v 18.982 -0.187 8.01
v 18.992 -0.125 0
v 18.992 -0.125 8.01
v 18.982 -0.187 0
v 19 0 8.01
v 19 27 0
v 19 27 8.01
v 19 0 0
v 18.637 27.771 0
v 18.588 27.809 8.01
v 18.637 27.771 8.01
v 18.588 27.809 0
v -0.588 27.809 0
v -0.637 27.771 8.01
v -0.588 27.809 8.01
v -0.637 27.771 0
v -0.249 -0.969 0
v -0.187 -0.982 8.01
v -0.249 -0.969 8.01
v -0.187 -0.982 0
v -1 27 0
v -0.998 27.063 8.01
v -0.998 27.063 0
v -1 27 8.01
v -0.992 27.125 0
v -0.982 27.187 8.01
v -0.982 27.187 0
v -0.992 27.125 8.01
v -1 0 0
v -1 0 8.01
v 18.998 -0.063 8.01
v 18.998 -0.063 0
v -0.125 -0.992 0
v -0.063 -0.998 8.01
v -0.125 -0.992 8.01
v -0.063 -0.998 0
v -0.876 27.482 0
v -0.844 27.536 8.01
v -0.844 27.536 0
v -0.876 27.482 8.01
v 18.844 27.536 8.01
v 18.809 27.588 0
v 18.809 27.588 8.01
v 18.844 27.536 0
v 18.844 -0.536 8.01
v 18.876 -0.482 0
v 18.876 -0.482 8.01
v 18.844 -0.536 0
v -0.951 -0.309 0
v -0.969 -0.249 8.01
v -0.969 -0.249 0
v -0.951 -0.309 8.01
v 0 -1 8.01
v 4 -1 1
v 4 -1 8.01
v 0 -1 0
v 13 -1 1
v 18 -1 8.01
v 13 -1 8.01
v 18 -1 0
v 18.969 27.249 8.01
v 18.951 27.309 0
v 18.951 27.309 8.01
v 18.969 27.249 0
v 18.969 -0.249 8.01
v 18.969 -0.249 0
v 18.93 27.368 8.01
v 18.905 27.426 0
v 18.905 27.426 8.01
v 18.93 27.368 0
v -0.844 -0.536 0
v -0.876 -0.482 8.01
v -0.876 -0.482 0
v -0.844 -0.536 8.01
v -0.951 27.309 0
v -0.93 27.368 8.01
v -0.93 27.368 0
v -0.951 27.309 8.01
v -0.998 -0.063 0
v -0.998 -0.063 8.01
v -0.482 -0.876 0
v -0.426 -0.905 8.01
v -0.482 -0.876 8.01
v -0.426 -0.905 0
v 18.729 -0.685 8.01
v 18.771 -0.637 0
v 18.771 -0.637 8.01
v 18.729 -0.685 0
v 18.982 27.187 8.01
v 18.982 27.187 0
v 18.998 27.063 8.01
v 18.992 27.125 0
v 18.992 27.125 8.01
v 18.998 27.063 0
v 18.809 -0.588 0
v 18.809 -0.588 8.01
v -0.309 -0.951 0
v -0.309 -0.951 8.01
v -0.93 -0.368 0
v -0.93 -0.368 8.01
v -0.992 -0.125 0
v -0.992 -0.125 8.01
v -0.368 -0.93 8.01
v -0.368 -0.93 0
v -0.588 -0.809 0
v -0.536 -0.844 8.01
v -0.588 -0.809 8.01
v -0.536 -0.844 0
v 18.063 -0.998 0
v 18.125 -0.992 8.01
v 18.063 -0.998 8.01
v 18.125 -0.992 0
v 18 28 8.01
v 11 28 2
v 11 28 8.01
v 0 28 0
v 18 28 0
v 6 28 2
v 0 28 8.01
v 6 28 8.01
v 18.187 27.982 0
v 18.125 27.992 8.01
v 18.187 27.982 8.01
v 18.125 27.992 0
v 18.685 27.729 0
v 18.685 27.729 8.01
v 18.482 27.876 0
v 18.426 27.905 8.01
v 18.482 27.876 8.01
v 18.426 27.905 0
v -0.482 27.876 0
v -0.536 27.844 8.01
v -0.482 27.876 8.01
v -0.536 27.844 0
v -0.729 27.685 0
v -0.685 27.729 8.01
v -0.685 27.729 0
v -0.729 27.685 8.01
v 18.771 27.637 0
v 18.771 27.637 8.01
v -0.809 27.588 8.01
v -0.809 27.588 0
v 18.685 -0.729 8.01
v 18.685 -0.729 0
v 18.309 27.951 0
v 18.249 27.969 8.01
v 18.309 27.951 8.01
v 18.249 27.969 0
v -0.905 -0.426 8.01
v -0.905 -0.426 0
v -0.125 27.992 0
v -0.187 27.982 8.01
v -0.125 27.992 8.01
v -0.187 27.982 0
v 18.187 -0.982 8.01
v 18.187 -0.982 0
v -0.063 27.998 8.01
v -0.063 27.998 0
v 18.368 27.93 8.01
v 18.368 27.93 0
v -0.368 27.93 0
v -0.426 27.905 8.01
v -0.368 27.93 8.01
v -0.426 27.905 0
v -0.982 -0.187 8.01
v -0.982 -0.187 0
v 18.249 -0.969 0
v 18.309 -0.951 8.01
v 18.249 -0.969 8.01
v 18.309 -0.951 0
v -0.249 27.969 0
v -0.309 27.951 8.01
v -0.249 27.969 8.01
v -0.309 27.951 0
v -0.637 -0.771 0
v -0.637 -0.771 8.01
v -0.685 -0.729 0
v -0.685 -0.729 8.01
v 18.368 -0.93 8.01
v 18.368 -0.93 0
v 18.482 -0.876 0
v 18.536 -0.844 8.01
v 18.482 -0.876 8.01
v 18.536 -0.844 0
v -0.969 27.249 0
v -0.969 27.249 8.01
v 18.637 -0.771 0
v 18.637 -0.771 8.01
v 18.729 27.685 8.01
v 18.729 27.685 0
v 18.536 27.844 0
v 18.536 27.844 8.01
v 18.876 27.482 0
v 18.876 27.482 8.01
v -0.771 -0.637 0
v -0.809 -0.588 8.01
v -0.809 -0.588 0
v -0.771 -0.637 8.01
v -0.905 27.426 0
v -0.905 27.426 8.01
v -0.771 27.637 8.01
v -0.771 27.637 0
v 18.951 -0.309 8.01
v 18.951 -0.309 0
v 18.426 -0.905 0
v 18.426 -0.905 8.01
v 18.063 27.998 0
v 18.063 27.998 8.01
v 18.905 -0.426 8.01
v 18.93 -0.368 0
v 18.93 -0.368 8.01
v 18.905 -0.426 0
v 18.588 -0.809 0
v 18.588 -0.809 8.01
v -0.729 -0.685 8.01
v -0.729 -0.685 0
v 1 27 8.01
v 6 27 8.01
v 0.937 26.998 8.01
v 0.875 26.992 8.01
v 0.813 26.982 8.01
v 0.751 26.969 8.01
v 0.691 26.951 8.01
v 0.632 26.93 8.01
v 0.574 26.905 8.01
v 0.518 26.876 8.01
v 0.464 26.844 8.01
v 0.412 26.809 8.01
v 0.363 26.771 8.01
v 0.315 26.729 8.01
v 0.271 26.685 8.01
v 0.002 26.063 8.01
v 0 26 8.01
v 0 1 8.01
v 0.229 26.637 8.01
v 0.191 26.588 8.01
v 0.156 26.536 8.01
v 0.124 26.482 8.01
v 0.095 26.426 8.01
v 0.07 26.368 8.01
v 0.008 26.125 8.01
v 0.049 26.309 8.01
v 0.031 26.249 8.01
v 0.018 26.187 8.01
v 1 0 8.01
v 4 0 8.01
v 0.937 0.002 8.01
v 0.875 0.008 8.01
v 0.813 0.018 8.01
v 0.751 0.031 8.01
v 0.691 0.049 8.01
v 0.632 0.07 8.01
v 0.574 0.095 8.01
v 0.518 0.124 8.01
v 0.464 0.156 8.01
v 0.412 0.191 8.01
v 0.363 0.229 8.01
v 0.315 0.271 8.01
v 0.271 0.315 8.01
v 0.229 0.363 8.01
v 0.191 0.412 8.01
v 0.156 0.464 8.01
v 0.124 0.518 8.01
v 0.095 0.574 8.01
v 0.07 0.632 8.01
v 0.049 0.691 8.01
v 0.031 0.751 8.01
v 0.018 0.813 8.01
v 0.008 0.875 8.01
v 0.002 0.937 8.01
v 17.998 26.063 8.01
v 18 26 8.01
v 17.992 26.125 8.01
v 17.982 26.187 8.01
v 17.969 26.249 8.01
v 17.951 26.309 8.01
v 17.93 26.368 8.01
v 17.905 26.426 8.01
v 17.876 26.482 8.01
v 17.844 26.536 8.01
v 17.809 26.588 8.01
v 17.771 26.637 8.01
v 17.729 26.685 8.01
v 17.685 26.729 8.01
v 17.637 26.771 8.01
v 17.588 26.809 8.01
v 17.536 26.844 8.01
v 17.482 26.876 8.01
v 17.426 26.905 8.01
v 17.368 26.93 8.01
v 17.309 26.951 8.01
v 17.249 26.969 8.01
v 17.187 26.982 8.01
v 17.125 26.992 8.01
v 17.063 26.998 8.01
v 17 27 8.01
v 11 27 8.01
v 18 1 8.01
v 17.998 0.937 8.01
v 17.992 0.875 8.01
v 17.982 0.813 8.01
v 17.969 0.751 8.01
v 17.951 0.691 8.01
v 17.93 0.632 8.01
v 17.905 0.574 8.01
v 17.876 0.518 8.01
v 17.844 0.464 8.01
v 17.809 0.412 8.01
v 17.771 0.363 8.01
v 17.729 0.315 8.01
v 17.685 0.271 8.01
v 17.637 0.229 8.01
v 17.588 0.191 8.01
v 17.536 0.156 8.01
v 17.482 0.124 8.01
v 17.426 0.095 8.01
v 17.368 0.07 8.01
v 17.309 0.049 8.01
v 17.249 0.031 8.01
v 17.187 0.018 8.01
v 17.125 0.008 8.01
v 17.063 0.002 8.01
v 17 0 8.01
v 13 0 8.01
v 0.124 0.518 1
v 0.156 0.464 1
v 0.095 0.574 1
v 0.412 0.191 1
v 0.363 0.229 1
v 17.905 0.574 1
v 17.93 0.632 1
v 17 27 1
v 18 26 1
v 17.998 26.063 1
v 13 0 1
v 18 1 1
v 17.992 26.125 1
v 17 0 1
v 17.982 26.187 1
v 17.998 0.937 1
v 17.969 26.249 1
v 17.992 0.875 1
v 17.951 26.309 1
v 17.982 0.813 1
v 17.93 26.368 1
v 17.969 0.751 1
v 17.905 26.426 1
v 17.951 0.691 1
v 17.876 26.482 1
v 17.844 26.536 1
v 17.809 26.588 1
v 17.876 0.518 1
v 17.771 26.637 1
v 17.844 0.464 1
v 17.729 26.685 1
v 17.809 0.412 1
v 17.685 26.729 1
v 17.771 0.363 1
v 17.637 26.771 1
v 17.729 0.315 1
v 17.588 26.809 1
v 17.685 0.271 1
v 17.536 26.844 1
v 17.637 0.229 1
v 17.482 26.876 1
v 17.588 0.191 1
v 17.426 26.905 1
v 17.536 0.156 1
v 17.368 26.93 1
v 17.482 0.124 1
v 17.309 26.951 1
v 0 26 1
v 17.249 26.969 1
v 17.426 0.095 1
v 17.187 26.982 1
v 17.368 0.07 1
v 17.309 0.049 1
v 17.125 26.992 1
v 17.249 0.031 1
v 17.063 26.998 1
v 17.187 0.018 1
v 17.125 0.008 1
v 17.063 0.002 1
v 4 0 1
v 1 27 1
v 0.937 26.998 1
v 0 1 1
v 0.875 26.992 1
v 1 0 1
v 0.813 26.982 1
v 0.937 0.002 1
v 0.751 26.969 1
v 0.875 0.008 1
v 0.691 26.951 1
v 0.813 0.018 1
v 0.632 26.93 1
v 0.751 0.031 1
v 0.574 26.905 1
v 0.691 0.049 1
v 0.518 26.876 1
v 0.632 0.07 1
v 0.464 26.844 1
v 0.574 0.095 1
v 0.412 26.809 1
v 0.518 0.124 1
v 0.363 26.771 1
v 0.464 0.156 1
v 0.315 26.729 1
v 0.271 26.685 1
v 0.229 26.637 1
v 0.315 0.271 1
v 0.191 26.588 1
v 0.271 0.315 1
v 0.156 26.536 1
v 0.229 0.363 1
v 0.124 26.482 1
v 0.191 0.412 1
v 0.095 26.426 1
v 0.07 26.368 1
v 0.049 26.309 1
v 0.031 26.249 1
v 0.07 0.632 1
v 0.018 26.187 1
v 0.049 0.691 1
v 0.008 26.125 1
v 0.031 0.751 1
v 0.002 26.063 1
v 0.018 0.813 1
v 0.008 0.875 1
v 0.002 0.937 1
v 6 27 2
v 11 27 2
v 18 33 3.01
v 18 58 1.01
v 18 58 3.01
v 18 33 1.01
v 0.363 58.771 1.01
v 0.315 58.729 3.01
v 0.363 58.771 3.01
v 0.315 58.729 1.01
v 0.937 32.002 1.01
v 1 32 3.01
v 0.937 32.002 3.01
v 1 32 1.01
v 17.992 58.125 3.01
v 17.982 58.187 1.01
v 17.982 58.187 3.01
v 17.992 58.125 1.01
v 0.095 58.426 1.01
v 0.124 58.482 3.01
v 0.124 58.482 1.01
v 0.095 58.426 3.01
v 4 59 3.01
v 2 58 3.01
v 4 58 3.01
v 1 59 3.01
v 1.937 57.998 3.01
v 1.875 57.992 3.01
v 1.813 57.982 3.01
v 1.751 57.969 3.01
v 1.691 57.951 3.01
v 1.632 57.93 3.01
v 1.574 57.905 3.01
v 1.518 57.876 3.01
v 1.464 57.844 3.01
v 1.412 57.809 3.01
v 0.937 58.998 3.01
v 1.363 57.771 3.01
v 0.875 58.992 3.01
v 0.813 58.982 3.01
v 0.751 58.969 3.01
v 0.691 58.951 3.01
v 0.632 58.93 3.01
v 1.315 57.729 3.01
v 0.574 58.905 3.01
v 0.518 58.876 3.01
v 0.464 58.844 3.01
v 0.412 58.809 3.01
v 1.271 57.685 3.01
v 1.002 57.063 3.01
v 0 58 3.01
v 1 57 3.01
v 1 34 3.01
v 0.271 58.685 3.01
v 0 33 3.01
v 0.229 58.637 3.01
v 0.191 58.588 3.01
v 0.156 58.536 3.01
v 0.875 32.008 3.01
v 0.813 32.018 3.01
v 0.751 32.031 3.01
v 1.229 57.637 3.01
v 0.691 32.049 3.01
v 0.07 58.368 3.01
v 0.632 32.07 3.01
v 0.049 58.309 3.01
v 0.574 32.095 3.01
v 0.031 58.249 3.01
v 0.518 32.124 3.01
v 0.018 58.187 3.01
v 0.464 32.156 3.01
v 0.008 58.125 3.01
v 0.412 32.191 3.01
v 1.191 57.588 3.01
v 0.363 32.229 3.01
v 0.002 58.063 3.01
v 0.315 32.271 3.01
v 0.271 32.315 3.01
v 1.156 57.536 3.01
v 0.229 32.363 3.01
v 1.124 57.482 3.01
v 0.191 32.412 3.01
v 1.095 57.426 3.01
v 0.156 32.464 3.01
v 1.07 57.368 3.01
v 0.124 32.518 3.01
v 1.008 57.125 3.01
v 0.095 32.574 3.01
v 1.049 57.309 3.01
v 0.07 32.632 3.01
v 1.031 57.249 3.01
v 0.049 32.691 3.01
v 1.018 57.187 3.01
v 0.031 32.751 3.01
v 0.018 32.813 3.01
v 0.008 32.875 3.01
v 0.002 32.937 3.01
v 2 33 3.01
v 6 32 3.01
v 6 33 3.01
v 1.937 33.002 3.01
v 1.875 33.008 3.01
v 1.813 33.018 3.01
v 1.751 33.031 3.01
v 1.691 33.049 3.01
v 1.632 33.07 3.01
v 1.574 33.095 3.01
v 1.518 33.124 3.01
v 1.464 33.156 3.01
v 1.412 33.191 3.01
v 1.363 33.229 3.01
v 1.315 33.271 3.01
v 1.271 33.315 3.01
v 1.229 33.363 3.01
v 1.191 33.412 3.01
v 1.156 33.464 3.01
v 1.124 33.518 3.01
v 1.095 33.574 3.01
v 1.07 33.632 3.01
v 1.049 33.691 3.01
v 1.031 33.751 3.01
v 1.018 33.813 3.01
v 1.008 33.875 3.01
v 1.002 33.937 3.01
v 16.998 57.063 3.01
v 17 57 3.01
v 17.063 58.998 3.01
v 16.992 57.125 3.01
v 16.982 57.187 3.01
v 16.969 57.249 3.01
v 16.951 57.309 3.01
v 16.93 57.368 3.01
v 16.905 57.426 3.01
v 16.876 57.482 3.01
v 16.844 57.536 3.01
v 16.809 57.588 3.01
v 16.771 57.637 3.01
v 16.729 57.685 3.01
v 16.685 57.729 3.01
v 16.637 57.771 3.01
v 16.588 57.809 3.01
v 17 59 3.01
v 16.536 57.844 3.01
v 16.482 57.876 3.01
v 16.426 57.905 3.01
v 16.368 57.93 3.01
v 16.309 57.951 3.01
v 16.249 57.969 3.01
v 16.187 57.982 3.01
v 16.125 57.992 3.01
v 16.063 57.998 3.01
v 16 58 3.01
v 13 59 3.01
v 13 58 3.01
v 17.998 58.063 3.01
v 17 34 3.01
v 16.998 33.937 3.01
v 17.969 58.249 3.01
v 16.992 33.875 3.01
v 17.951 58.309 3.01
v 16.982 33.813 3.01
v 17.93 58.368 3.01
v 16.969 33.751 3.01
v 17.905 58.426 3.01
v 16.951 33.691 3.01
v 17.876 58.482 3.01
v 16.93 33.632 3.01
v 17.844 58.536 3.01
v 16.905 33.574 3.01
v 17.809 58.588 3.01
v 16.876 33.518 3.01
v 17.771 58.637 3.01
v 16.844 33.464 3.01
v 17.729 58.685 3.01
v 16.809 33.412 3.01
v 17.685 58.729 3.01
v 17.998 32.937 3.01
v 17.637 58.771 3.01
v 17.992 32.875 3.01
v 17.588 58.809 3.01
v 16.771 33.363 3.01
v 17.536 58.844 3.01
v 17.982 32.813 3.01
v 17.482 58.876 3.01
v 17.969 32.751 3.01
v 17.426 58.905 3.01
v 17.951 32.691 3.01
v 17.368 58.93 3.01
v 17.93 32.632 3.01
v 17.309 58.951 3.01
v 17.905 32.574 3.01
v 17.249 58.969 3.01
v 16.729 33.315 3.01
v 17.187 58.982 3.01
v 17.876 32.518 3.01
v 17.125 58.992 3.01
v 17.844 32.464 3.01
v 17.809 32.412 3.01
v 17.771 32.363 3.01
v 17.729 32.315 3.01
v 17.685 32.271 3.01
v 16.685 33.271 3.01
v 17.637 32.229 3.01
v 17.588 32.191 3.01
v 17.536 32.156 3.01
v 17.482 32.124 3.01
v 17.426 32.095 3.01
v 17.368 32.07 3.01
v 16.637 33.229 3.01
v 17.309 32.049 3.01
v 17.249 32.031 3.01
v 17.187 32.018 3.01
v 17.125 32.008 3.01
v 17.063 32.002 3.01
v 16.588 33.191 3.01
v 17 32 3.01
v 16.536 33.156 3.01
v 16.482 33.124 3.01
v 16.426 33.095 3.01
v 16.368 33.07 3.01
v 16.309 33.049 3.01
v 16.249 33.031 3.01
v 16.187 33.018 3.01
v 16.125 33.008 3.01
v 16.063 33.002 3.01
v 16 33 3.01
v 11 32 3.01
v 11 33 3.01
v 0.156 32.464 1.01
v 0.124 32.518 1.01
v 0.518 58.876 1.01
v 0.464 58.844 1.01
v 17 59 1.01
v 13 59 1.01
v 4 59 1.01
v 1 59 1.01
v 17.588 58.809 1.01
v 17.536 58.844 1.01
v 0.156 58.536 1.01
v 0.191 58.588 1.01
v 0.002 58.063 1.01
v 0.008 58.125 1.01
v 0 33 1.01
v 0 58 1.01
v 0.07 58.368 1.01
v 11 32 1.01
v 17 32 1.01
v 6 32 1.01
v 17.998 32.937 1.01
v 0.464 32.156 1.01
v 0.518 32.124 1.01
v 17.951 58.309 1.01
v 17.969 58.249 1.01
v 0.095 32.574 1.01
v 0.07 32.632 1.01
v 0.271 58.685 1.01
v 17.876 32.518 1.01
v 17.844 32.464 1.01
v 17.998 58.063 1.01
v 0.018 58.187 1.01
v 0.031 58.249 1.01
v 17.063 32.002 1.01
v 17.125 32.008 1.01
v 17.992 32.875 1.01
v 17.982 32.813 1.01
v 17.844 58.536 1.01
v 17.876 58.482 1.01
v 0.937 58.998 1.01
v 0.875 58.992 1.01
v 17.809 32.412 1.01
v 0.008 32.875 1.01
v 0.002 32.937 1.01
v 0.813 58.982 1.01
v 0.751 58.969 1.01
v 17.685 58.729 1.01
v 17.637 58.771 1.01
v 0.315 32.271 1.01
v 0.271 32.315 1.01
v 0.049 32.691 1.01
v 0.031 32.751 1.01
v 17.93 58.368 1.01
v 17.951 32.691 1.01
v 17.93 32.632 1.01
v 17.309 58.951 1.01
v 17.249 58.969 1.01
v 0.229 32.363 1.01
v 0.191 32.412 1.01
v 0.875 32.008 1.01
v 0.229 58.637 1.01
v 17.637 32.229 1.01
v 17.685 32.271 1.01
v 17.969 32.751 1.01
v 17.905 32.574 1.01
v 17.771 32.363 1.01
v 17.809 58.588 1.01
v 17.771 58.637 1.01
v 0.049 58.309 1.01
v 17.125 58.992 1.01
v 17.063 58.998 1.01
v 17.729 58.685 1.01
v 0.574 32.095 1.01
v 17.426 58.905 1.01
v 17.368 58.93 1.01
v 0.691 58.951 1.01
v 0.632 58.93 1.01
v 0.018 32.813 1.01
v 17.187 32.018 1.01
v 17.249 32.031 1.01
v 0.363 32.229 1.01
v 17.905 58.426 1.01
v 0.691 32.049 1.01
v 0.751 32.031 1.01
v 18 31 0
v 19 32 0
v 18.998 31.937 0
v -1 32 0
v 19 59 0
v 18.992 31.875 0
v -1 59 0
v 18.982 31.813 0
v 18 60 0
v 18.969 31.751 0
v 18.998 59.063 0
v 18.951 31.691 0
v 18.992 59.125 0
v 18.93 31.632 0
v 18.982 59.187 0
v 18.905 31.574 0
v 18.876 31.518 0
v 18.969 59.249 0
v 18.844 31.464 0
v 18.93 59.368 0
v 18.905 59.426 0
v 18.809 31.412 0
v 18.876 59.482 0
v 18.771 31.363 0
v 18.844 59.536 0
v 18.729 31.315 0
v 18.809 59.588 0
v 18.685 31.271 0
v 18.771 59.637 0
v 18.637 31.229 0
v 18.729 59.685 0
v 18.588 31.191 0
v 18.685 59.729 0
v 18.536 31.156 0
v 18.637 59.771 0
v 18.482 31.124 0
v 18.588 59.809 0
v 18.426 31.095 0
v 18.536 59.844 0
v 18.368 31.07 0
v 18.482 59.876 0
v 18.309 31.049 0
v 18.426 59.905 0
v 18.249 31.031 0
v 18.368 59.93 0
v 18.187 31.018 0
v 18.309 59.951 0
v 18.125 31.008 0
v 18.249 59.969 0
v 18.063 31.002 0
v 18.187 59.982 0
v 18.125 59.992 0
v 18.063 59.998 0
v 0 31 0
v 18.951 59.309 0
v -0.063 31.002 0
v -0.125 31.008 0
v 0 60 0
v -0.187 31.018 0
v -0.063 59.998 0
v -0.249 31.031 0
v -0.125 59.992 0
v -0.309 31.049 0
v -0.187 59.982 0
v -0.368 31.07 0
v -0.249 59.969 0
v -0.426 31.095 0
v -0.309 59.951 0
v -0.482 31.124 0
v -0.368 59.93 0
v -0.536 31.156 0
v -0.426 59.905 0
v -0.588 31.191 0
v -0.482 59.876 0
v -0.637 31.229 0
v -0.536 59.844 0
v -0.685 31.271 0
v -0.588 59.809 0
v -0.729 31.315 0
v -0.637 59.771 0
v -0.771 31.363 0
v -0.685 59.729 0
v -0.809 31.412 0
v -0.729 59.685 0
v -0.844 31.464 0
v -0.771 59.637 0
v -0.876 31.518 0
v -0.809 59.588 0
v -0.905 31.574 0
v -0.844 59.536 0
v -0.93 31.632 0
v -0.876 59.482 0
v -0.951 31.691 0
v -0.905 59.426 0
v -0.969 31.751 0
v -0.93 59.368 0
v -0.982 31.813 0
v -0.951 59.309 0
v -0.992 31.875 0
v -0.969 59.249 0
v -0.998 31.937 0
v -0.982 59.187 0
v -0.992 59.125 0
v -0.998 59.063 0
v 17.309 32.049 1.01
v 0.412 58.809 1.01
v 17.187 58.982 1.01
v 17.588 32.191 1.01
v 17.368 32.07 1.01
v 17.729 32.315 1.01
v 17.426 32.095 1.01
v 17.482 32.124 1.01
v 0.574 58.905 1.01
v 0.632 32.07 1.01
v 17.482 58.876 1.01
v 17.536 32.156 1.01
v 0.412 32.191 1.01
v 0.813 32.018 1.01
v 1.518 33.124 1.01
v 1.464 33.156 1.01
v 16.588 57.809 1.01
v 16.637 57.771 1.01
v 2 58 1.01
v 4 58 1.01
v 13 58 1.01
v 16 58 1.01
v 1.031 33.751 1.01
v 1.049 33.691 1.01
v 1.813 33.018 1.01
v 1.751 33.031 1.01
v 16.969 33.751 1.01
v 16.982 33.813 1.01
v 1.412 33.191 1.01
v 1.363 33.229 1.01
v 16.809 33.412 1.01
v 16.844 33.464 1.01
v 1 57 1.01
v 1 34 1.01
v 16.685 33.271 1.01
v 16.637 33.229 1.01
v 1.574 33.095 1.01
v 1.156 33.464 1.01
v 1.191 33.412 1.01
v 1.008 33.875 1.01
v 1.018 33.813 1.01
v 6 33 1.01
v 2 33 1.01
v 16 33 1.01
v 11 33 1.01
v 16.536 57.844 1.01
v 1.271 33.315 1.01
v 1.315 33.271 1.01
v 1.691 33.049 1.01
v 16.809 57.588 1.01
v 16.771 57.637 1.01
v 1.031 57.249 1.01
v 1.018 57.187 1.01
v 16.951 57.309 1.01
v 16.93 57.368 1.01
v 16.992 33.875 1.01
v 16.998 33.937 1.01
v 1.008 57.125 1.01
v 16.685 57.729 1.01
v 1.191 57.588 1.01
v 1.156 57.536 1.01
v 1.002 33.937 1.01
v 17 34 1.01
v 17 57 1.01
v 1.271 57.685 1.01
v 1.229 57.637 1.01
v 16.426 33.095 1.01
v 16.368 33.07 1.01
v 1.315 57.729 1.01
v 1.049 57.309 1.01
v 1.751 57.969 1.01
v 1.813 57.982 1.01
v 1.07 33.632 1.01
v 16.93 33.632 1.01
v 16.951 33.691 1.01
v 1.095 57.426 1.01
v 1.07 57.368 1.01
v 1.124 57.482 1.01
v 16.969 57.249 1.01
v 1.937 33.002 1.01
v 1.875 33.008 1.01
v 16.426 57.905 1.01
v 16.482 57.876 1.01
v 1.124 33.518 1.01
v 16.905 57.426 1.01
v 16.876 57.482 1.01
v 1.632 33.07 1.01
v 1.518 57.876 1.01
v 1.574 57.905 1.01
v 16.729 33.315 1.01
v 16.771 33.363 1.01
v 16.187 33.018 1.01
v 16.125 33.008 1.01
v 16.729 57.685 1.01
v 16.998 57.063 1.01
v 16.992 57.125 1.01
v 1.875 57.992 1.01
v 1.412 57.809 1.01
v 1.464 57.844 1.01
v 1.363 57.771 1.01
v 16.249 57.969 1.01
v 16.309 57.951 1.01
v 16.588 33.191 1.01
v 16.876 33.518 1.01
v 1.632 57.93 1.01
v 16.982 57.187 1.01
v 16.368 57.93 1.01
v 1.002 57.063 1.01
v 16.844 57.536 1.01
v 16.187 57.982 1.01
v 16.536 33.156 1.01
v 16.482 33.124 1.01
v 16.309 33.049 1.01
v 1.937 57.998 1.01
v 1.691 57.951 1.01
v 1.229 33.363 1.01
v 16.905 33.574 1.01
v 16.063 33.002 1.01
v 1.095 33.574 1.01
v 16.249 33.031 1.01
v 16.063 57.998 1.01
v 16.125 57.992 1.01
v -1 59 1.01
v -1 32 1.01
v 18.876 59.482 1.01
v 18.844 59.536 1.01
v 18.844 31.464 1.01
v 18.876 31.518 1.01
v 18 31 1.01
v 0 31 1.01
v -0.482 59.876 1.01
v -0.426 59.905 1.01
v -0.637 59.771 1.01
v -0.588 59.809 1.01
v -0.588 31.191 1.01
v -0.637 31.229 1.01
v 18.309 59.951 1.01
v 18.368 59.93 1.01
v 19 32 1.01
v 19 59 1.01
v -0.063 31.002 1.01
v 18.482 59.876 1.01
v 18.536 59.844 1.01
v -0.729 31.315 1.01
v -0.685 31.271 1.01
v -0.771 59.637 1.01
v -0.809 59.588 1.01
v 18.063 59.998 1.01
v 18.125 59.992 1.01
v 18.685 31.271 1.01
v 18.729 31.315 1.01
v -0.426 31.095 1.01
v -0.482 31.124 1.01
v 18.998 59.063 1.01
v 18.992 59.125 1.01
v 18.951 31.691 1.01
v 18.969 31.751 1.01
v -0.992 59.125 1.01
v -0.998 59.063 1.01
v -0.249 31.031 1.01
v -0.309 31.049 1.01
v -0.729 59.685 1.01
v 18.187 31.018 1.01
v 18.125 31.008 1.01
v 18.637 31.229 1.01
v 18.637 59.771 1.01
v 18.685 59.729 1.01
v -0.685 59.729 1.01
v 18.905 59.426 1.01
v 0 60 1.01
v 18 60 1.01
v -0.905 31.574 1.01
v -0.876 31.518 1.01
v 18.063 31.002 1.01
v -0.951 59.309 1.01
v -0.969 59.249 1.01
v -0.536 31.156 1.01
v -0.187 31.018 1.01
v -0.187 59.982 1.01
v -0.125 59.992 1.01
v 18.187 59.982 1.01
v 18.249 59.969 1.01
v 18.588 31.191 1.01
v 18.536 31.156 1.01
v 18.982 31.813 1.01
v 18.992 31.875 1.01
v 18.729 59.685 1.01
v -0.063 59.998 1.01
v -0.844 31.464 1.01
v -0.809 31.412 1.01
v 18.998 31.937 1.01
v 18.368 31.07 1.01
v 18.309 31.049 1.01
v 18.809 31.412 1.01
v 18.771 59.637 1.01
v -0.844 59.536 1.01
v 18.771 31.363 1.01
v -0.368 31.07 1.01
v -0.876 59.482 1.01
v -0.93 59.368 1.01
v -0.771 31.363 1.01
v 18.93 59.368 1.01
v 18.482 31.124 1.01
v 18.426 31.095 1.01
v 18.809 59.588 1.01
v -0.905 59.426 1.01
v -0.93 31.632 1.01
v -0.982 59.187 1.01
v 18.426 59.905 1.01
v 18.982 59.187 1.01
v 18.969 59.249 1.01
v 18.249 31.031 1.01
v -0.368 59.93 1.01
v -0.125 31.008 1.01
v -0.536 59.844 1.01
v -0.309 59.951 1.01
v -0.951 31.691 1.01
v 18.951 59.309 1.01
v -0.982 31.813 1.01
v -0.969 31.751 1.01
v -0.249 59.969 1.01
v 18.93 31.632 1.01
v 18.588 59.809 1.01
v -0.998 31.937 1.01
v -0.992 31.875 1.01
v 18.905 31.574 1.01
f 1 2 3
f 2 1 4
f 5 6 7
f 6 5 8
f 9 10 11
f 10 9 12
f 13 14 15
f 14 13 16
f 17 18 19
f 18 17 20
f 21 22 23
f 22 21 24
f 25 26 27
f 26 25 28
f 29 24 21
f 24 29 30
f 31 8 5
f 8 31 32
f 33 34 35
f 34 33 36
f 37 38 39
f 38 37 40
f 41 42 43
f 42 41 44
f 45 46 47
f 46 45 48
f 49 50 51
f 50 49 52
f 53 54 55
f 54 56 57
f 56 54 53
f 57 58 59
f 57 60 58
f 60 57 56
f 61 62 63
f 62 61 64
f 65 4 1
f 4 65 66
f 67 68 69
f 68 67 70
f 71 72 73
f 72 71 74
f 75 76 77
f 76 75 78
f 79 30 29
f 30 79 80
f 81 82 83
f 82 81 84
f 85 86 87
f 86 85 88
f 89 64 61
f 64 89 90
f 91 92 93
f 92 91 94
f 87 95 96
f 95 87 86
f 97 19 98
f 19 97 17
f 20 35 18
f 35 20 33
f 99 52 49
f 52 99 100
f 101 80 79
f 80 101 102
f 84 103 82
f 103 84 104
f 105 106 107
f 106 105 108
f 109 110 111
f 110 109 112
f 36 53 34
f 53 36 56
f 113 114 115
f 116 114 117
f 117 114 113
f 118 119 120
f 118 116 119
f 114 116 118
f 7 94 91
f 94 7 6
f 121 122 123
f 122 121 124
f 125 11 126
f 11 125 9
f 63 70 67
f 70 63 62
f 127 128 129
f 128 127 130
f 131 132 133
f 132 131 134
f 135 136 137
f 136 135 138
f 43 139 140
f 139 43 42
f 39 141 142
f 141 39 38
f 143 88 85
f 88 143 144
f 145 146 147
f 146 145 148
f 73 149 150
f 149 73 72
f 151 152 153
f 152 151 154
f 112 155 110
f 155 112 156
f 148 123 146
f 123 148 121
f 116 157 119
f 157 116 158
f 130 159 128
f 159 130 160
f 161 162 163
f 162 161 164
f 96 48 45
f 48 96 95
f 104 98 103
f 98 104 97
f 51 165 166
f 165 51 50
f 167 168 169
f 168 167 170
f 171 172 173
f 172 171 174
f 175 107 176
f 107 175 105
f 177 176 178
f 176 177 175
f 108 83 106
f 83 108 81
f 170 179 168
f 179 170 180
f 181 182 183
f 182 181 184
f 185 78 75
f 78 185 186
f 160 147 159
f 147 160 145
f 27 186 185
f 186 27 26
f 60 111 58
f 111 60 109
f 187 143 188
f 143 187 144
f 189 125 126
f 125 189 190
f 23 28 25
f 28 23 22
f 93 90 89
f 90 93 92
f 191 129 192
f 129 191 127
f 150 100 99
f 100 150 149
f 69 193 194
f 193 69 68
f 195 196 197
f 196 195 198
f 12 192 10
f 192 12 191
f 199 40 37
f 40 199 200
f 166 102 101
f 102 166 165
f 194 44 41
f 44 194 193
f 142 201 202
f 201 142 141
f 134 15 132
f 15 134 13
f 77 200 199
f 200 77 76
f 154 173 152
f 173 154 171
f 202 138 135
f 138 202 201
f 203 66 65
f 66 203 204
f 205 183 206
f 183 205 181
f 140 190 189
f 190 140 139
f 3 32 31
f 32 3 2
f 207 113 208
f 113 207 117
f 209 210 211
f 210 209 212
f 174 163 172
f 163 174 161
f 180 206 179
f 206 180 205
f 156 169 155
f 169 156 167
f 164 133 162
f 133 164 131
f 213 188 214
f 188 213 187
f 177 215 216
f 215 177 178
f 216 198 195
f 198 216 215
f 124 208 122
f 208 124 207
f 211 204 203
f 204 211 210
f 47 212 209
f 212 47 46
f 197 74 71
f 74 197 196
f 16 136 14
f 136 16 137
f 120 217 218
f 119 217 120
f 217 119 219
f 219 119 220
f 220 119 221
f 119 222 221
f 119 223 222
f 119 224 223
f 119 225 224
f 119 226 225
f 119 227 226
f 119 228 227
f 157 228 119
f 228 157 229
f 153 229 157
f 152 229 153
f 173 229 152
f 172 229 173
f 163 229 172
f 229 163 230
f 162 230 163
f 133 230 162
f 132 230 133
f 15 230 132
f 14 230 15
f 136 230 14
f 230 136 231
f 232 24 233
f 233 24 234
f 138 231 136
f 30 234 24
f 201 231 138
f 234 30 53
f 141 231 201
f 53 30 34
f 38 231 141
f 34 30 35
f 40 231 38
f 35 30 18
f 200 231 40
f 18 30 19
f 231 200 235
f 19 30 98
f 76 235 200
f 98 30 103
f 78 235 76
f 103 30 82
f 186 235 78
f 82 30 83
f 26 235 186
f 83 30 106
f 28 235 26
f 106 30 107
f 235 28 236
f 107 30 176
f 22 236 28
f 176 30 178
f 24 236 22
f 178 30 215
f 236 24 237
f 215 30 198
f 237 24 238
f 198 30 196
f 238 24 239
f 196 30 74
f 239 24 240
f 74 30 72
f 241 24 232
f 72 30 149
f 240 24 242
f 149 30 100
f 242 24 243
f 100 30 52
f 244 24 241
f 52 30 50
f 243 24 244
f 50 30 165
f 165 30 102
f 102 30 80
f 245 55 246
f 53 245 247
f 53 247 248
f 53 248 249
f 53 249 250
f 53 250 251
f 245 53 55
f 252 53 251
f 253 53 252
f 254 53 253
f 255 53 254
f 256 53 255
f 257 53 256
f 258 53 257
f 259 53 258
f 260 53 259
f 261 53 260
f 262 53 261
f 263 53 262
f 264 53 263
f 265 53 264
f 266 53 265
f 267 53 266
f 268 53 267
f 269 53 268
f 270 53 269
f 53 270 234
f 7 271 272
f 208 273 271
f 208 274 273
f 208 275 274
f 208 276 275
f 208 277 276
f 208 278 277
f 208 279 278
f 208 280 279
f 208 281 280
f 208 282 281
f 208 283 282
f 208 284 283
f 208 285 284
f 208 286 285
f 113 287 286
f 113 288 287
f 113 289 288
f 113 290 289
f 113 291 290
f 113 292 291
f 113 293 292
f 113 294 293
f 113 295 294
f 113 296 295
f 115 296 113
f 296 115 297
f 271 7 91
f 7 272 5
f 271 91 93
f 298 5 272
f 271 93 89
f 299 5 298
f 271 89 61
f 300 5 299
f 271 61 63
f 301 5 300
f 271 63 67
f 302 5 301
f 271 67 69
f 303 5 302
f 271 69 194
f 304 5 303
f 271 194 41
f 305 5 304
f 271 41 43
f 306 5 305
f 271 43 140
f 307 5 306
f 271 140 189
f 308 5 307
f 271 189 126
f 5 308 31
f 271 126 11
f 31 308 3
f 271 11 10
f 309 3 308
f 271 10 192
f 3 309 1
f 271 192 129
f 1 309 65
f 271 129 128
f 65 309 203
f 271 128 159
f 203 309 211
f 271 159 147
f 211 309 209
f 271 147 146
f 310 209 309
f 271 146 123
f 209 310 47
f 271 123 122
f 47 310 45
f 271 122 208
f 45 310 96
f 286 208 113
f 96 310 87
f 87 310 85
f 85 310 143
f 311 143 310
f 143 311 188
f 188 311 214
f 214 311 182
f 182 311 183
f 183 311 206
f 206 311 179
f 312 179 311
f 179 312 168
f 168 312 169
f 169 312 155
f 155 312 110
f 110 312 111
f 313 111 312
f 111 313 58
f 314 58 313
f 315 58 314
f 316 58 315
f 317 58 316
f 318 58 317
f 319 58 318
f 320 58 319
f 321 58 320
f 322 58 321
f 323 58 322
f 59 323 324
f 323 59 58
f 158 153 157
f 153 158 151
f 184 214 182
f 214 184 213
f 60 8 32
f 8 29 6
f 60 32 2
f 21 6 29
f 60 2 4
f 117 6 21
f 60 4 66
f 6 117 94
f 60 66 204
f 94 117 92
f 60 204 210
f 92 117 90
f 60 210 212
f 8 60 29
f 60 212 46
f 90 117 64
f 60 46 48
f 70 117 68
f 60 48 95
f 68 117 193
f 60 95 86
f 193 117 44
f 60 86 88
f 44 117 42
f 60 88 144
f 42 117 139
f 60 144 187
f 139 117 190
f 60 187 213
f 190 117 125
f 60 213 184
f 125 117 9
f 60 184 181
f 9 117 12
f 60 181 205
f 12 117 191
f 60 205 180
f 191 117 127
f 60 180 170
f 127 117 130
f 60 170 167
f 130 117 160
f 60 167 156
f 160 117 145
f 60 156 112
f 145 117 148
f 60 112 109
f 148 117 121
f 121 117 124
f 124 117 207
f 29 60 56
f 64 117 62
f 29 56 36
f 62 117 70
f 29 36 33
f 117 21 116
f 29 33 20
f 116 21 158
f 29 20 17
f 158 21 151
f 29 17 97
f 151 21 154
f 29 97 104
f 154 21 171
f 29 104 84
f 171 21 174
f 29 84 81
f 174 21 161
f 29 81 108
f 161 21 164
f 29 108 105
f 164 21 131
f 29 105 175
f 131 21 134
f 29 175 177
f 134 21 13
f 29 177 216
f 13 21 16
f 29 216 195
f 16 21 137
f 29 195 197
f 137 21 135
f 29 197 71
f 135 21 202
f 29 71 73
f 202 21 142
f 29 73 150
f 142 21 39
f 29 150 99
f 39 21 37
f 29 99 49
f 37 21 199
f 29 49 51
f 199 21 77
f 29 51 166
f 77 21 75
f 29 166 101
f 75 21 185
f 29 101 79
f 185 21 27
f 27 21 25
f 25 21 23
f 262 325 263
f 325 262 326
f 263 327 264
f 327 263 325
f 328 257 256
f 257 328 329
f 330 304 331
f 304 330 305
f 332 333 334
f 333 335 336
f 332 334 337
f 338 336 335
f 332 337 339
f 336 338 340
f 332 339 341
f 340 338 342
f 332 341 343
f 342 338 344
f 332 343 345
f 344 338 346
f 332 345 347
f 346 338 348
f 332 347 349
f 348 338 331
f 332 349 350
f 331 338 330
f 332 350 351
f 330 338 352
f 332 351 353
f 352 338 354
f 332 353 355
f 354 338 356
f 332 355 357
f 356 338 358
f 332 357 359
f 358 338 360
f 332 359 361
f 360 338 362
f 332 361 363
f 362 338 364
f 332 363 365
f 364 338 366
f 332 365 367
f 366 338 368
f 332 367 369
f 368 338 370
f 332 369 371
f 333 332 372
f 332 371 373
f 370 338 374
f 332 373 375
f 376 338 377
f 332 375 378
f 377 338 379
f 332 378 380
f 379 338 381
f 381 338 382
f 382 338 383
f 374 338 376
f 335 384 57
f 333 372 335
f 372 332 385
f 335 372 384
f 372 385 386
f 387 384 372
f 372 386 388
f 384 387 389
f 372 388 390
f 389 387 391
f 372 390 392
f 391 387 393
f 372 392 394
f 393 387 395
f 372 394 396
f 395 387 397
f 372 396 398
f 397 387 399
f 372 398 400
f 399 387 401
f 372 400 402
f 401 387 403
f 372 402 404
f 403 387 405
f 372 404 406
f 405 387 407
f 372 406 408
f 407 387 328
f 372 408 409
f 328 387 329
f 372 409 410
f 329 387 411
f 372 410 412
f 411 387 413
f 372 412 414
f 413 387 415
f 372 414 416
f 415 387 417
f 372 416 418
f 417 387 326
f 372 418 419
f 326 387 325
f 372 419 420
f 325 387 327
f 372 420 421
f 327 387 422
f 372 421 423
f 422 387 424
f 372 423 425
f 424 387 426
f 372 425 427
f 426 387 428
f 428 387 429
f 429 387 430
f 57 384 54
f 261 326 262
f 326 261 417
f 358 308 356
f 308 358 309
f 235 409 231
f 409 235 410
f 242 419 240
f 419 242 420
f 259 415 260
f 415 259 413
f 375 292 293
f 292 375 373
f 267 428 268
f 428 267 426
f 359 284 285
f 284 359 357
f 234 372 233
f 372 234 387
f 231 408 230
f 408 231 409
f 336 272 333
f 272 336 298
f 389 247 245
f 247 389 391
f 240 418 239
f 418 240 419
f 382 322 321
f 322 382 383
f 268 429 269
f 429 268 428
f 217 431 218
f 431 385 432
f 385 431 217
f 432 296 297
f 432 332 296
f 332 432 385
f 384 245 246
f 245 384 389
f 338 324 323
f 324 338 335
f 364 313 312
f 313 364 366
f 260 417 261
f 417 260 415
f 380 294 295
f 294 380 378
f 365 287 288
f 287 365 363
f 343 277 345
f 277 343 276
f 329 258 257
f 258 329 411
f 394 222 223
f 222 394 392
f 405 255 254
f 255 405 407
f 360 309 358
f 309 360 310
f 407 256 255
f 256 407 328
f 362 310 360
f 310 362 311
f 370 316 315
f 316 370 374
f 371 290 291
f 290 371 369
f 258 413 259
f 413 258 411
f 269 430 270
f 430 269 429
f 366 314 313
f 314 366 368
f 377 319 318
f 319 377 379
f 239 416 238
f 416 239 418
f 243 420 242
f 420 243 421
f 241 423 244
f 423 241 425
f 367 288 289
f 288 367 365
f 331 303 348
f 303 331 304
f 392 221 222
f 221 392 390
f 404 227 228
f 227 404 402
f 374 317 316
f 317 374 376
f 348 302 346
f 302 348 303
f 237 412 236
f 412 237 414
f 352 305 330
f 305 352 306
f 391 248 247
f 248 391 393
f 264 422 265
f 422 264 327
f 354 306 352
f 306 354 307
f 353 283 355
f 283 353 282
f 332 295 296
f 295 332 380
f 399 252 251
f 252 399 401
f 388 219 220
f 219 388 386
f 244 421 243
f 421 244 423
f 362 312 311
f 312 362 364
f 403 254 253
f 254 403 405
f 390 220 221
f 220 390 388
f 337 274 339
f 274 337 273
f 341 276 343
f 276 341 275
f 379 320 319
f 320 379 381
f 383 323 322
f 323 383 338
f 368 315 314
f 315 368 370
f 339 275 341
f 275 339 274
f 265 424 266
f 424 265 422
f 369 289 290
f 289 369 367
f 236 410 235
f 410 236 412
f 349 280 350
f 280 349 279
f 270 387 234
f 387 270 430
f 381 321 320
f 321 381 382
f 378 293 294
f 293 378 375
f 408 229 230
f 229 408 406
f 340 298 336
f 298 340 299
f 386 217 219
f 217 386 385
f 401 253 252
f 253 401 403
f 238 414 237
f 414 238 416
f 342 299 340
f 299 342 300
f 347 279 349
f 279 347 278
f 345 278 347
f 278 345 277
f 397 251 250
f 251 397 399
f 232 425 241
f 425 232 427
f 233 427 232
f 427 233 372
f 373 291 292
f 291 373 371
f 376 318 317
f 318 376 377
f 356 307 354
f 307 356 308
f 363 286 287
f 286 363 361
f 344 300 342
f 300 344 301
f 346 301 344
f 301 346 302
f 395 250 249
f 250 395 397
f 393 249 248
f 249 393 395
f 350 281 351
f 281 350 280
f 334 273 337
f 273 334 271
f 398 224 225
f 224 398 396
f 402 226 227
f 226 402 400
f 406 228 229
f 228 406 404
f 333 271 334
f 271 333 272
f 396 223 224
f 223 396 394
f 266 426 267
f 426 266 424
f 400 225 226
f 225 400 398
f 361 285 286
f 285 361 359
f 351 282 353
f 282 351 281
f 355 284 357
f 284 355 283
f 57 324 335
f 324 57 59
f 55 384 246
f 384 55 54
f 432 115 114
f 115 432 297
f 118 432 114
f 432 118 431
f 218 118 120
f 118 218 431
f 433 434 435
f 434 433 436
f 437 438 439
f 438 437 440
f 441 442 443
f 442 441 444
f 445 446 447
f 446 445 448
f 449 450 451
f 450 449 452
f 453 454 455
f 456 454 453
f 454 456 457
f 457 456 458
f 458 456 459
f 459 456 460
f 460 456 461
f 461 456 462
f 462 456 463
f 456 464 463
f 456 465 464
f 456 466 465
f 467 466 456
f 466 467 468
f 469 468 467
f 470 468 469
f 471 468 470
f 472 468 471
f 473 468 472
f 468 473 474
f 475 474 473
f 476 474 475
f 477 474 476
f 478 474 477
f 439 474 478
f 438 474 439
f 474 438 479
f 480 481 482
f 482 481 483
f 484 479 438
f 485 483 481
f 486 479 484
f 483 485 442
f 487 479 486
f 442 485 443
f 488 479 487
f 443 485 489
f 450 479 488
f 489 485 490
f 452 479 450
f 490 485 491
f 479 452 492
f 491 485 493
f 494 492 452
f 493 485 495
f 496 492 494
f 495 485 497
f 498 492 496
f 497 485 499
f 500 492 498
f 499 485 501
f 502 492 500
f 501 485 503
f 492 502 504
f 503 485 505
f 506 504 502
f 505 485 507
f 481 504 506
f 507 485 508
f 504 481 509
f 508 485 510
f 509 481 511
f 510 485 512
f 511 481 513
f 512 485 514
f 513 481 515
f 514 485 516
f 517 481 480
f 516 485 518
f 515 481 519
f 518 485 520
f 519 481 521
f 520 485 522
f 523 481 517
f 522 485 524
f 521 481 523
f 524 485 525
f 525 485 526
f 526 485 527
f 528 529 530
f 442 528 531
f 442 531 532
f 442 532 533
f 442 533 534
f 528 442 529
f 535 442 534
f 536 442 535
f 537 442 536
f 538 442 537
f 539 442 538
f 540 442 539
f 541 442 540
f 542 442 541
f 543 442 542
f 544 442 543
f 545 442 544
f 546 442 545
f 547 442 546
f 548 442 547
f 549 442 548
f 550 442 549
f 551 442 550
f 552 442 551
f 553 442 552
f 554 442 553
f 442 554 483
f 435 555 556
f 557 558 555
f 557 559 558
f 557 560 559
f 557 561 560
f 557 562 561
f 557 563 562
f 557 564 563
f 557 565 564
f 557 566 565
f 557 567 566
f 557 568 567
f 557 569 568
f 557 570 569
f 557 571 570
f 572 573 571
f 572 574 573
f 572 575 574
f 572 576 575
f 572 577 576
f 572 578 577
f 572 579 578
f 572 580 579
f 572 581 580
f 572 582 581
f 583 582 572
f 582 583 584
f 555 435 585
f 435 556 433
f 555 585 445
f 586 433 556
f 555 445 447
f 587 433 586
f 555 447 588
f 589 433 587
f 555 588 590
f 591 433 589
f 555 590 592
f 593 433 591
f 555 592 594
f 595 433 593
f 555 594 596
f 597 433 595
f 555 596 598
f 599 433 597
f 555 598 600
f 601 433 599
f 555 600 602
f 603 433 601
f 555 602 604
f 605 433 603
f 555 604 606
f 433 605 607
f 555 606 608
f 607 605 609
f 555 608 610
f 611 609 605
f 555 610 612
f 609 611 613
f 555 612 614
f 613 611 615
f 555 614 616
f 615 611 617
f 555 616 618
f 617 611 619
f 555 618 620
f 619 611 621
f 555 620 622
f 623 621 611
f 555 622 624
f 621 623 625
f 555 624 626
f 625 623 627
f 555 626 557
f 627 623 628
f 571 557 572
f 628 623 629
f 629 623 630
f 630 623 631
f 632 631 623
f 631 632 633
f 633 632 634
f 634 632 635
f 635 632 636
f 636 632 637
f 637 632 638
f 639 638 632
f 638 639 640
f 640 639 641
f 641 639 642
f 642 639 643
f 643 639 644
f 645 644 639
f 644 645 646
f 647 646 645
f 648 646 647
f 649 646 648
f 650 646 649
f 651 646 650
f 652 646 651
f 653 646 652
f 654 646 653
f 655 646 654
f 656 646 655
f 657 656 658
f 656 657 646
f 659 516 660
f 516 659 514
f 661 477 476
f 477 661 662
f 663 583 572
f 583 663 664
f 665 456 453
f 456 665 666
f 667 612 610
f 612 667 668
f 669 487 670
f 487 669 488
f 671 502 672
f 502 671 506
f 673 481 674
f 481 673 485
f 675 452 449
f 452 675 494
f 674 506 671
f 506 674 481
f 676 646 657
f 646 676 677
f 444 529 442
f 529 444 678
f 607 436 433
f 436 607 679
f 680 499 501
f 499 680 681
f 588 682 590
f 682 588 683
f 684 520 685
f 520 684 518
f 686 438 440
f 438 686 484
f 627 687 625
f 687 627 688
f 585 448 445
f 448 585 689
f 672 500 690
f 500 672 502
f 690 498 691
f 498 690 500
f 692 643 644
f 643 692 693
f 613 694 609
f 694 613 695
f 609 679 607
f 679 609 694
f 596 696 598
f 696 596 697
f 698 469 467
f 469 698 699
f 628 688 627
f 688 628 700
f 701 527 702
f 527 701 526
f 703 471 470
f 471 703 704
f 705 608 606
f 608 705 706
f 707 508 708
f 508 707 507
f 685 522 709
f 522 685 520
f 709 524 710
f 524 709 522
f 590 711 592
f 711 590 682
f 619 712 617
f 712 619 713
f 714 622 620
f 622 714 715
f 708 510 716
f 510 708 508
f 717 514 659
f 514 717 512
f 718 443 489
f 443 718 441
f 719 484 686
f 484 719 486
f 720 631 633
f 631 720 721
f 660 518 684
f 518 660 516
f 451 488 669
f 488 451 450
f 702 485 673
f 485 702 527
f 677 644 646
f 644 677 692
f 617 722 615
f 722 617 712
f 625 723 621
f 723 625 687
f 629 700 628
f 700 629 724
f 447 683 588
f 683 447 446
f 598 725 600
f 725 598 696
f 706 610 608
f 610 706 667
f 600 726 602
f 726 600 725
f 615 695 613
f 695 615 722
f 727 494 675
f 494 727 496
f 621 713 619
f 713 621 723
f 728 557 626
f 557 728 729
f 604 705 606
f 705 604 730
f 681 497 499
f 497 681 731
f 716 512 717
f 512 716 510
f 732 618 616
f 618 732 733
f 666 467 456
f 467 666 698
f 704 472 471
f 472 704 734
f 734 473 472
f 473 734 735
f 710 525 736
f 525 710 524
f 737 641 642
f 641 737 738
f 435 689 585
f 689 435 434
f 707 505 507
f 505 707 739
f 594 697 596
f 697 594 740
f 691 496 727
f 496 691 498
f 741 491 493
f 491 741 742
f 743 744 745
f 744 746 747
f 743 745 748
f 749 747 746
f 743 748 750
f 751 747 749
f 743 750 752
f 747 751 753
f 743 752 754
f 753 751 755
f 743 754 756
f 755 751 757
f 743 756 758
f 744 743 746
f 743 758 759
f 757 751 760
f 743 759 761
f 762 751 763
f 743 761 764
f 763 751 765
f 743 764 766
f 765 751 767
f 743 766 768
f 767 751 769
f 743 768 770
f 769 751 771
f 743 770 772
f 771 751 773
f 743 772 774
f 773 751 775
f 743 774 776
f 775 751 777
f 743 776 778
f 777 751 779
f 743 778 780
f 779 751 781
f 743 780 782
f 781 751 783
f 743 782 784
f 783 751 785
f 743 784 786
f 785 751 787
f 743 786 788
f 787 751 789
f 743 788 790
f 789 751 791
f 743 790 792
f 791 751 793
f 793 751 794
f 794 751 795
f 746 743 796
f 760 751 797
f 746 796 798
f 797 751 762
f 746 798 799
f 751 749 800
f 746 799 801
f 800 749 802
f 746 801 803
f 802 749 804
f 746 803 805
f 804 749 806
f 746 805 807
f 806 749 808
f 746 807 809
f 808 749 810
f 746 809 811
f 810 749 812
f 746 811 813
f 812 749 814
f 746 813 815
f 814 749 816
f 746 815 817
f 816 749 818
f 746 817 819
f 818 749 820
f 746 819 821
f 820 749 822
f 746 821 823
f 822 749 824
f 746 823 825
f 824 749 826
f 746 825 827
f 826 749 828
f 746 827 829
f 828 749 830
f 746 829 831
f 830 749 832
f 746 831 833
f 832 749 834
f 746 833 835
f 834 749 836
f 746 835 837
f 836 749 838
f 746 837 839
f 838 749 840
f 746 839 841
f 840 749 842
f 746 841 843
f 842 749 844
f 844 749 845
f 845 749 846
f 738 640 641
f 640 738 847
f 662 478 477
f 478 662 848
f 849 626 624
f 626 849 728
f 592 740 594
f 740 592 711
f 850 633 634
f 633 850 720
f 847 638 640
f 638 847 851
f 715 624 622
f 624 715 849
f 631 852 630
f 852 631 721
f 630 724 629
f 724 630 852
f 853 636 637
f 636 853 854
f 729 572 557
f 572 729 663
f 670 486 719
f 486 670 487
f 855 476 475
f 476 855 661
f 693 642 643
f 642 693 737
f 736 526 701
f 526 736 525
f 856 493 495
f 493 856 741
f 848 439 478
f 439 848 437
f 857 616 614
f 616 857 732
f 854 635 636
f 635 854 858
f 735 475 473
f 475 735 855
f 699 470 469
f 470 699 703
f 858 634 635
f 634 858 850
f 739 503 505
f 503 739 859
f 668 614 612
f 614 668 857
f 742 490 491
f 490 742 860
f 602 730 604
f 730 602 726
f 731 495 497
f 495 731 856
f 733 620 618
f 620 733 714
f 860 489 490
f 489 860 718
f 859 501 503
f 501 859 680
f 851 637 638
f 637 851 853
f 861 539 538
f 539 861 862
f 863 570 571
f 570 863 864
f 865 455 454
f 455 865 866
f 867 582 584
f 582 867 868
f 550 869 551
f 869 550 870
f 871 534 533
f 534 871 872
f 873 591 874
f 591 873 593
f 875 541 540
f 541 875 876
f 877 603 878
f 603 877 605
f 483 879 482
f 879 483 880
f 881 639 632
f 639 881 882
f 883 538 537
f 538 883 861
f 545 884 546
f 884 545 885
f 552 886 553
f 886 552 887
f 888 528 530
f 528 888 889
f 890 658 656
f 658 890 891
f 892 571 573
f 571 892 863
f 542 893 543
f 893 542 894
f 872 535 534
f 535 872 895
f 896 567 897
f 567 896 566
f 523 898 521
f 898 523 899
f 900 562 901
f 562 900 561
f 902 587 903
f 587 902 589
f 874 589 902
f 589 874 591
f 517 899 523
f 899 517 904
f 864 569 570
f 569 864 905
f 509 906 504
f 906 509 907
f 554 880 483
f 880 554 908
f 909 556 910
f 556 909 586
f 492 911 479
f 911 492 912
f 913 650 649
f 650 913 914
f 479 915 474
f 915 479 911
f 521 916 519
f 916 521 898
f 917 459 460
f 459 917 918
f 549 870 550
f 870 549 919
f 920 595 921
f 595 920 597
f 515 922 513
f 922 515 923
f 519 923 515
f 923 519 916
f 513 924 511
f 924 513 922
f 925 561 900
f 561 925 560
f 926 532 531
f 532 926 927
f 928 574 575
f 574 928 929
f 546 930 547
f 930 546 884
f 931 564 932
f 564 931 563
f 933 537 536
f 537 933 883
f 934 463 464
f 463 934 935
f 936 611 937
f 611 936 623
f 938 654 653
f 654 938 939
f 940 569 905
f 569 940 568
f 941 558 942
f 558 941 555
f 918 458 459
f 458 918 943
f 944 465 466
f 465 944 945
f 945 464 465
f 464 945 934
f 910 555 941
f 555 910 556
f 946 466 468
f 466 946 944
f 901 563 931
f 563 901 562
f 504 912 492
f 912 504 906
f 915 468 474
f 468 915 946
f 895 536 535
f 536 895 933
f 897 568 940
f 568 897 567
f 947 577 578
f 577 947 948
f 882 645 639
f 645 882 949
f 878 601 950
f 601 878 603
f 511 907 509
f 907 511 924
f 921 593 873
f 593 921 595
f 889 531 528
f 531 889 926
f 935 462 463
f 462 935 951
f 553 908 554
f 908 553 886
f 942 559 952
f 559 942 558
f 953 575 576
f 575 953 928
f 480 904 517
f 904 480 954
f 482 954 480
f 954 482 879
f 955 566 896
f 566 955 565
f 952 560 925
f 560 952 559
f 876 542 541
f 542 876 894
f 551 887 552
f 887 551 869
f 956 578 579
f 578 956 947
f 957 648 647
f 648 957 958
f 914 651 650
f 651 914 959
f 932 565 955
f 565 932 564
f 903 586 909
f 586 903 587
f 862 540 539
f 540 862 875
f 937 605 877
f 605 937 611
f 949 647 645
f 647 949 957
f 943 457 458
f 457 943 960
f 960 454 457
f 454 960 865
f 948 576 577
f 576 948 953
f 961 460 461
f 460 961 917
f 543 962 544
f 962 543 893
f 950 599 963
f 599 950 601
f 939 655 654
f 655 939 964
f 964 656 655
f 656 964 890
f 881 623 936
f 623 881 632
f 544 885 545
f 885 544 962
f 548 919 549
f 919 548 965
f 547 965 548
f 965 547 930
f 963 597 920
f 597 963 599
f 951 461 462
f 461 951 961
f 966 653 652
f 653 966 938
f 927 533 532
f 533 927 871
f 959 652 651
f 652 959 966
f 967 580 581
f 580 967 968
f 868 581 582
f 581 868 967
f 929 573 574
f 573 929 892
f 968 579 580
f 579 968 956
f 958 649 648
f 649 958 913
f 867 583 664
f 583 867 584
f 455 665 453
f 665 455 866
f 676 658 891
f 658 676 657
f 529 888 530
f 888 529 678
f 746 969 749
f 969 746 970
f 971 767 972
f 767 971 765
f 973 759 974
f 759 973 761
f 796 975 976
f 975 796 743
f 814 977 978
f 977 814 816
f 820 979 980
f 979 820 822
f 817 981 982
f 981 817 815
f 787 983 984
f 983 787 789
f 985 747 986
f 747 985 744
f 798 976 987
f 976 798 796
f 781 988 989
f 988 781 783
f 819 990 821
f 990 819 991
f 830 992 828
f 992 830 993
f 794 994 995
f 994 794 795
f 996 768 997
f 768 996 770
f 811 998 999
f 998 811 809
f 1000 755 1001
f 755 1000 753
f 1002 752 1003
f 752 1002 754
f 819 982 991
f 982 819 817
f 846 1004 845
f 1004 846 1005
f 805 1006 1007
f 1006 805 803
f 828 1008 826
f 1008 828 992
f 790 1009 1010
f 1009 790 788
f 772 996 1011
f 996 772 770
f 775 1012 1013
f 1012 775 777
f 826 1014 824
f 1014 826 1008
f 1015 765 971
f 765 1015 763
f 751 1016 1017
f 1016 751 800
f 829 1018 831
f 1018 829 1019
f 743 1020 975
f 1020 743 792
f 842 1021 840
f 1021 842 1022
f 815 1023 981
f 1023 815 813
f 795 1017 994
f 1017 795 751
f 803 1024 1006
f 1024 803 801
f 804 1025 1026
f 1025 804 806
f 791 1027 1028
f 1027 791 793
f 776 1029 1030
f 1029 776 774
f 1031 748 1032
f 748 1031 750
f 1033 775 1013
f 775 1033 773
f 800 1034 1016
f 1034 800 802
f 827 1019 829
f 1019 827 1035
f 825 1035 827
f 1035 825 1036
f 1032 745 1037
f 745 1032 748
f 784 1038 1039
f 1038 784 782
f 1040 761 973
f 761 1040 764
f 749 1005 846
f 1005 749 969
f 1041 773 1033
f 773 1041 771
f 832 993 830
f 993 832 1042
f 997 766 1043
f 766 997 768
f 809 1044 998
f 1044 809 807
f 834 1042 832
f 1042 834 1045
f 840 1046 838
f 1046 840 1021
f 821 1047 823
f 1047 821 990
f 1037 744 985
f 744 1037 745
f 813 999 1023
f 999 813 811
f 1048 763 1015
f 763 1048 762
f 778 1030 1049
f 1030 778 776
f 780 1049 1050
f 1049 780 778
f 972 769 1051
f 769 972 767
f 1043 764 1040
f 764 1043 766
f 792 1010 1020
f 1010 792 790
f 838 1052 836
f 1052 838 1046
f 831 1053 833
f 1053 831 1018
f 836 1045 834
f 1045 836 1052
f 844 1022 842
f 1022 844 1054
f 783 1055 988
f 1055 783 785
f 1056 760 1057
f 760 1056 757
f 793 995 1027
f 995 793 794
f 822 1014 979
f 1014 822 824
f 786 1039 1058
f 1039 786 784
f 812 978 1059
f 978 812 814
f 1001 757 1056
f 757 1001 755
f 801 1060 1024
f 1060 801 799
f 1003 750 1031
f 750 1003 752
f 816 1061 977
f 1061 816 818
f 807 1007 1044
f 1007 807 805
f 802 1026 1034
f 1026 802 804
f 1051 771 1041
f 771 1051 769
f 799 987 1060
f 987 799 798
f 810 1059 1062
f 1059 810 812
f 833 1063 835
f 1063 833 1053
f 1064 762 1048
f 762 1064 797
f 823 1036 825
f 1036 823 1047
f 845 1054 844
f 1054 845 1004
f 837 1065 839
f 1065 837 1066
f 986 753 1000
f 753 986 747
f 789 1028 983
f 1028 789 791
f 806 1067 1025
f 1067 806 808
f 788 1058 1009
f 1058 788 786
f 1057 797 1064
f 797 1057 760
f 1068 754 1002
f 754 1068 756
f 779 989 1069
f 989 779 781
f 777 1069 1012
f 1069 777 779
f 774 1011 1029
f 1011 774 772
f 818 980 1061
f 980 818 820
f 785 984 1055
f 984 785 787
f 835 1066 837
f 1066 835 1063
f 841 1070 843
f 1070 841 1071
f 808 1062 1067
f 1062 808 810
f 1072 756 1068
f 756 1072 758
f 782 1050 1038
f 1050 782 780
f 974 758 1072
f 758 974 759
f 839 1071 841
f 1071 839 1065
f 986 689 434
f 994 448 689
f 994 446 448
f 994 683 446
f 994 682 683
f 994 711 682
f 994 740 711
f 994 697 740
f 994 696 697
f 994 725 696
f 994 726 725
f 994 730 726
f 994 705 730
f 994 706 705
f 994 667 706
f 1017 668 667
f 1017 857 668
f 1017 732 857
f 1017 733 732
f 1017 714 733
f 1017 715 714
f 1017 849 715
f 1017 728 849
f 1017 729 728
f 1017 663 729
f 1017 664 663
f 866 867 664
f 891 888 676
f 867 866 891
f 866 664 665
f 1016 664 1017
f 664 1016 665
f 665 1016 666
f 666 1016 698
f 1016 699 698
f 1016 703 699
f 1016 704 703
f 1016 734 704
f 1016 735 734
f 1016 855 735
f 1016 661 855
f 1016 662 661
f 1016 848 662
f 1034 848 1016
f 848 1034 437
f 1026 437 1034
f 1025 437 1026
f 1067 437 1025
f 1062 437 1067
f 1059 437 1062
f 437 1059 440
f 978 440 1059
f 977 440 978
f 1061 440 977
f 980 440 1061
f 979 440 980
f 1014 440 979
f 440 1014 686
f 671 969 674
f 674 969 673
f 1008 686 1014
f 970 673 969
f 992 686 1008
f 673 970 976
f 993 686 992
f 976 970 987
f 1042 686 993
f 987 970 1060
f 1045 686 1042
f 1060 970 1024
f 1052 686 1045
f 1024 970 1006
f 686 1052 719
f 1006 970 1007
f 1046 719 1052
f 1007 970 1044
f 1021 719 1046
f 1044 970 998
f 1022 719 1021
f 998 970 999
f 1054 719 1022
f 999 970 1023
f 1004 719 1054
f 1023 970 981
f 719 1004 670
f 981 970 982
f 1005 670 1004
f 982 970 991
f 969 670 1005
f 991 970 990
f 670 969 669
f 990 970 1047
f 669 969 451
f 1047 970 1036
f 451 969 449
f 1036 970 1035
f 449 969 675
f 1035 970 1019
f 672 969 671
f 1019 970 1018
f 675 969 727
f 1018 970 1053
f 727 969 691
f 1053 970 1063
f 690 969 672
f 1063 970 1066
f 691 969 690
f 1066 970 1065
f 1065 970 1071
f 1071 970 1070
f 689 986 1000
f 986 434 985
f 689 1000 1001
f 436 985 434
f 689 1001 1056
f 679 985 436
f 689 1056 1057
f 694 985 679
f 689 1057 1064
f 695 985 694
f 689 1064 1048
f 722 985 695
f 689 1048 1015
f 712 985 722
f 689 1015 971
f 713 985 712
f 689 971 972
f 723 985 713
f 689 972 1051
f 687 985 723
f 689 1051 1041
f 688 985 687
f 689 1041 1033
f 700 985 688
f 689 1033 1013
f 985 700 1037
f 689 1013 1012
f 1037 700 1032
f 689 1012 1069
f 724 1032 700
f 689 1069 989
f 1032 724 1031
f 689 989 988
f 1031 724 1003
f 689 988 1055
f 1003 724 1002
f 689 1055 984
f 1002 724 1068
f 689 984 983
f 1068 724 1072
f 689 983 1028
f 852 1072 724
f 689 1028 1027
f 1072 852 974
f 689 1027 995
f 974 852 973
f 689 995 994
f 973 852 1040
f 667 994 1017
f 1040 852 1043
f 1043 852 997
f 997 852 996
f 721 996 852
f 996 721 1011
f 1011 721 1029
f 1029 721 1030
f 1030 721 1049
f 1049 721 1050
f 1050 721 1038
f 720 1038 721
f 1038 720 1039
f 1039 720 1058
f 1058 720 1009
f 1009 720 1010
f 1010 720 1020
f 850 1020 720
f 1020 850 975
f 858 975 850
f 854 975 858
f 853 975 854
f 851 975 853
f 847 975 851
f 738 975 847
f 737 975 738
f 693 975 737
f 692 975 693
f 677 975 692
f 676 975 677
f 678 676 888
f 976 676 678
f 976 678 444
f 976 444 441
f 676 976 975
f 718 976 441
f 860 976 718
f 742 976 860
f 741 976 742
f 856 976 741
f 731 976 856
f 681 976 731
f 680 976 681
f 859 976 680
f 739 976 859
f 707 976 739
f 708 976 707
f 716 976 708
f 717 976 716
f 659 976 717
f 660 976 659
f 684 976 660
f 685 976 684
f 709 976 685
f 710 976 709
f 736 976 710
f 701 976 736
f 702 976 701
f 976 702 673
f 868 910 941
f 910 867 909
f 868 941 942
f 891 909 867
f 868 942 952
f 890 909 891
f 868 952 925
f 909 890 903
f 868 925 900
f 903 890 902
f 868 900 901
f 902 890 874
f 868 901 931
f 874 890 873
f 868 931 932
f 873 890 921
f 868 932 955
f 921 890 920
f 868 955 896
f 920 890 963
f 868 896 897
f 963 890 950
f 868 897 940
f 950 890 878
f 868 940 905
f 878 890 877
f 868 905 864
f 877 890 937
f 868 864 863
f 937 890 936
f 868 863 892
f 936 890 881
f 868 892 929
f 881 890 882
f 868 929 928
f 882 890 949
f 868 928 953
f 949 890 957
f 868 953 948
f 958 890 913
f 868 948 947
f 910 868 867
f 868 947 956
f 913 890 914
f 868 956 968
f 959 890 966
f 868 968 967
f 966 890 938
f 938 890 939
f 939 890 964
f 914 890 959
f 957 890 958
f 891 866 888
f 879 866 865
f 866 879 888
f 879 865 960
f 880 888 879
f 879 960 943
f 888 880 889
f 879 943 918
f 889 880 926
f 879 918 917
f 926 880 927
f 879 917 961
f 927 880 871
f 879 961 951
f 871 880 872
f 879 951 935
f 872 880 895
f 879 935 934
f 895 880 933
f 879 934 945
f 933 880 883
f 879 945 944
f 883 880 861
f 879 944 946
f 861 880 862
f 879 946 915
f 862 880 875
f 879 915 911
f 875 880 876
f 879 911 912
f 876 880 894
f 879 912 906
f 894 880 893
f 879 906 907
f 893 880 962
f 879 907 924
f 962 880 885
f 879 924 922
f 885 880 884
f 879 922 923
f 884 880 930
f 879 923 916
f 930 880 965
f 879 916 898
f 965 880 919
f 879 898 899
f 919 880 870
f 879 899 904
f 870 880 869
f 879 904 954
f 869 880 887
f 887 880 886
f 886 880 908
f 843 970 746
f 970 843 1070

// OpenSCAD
// upgrade resolution
$fn = 100;

// dimensions
length = 27;
width = 18;
height = 6;
cornerRadius = 1;
rimHeight = 2;
lidHeight = 1;

// rounded hollow box
difference() {
    roundedBox(length+2, width+2, height+2, cornerRadius); 
    translate([1,1,1]) roundedBox(length, width, height+2, cornerRadius);

    // usb+wire holes
    translate([4,-2,1]) cube([9,3,height+2]);
    translate([6,length-1,2]) cube([5,3,height+1]);
}

// lid
translate([0, length*2+5, 0]) {
    mirror([0,1,0]) {
        roundedBox(length+2, width+2, 1, cornerRadius);
        difference() {
            // rim on lid
            translate([1,1,0]) roundedBox(length,width,lidHeight+rimHeight,cornerRadius);
            translate([2,2,1]) roundedBox(length-2,width-2,lidHeight+rimHeight,cornerRadius);

            // usb+wire holes
            translate([4,-1,1]) cube([9,3,3]);
            translate([6,length-2,1]) cube([5,3,3]);
        }
    }
}

// functions
module roundedBox(length, width, height, radius)
{
    dRadius = 2*radius;
    minkowski() {
        cube(size=[width-dRadius,length-dRadius, height]);
        cylinder(r=radius, h=0.01);
    }
}
